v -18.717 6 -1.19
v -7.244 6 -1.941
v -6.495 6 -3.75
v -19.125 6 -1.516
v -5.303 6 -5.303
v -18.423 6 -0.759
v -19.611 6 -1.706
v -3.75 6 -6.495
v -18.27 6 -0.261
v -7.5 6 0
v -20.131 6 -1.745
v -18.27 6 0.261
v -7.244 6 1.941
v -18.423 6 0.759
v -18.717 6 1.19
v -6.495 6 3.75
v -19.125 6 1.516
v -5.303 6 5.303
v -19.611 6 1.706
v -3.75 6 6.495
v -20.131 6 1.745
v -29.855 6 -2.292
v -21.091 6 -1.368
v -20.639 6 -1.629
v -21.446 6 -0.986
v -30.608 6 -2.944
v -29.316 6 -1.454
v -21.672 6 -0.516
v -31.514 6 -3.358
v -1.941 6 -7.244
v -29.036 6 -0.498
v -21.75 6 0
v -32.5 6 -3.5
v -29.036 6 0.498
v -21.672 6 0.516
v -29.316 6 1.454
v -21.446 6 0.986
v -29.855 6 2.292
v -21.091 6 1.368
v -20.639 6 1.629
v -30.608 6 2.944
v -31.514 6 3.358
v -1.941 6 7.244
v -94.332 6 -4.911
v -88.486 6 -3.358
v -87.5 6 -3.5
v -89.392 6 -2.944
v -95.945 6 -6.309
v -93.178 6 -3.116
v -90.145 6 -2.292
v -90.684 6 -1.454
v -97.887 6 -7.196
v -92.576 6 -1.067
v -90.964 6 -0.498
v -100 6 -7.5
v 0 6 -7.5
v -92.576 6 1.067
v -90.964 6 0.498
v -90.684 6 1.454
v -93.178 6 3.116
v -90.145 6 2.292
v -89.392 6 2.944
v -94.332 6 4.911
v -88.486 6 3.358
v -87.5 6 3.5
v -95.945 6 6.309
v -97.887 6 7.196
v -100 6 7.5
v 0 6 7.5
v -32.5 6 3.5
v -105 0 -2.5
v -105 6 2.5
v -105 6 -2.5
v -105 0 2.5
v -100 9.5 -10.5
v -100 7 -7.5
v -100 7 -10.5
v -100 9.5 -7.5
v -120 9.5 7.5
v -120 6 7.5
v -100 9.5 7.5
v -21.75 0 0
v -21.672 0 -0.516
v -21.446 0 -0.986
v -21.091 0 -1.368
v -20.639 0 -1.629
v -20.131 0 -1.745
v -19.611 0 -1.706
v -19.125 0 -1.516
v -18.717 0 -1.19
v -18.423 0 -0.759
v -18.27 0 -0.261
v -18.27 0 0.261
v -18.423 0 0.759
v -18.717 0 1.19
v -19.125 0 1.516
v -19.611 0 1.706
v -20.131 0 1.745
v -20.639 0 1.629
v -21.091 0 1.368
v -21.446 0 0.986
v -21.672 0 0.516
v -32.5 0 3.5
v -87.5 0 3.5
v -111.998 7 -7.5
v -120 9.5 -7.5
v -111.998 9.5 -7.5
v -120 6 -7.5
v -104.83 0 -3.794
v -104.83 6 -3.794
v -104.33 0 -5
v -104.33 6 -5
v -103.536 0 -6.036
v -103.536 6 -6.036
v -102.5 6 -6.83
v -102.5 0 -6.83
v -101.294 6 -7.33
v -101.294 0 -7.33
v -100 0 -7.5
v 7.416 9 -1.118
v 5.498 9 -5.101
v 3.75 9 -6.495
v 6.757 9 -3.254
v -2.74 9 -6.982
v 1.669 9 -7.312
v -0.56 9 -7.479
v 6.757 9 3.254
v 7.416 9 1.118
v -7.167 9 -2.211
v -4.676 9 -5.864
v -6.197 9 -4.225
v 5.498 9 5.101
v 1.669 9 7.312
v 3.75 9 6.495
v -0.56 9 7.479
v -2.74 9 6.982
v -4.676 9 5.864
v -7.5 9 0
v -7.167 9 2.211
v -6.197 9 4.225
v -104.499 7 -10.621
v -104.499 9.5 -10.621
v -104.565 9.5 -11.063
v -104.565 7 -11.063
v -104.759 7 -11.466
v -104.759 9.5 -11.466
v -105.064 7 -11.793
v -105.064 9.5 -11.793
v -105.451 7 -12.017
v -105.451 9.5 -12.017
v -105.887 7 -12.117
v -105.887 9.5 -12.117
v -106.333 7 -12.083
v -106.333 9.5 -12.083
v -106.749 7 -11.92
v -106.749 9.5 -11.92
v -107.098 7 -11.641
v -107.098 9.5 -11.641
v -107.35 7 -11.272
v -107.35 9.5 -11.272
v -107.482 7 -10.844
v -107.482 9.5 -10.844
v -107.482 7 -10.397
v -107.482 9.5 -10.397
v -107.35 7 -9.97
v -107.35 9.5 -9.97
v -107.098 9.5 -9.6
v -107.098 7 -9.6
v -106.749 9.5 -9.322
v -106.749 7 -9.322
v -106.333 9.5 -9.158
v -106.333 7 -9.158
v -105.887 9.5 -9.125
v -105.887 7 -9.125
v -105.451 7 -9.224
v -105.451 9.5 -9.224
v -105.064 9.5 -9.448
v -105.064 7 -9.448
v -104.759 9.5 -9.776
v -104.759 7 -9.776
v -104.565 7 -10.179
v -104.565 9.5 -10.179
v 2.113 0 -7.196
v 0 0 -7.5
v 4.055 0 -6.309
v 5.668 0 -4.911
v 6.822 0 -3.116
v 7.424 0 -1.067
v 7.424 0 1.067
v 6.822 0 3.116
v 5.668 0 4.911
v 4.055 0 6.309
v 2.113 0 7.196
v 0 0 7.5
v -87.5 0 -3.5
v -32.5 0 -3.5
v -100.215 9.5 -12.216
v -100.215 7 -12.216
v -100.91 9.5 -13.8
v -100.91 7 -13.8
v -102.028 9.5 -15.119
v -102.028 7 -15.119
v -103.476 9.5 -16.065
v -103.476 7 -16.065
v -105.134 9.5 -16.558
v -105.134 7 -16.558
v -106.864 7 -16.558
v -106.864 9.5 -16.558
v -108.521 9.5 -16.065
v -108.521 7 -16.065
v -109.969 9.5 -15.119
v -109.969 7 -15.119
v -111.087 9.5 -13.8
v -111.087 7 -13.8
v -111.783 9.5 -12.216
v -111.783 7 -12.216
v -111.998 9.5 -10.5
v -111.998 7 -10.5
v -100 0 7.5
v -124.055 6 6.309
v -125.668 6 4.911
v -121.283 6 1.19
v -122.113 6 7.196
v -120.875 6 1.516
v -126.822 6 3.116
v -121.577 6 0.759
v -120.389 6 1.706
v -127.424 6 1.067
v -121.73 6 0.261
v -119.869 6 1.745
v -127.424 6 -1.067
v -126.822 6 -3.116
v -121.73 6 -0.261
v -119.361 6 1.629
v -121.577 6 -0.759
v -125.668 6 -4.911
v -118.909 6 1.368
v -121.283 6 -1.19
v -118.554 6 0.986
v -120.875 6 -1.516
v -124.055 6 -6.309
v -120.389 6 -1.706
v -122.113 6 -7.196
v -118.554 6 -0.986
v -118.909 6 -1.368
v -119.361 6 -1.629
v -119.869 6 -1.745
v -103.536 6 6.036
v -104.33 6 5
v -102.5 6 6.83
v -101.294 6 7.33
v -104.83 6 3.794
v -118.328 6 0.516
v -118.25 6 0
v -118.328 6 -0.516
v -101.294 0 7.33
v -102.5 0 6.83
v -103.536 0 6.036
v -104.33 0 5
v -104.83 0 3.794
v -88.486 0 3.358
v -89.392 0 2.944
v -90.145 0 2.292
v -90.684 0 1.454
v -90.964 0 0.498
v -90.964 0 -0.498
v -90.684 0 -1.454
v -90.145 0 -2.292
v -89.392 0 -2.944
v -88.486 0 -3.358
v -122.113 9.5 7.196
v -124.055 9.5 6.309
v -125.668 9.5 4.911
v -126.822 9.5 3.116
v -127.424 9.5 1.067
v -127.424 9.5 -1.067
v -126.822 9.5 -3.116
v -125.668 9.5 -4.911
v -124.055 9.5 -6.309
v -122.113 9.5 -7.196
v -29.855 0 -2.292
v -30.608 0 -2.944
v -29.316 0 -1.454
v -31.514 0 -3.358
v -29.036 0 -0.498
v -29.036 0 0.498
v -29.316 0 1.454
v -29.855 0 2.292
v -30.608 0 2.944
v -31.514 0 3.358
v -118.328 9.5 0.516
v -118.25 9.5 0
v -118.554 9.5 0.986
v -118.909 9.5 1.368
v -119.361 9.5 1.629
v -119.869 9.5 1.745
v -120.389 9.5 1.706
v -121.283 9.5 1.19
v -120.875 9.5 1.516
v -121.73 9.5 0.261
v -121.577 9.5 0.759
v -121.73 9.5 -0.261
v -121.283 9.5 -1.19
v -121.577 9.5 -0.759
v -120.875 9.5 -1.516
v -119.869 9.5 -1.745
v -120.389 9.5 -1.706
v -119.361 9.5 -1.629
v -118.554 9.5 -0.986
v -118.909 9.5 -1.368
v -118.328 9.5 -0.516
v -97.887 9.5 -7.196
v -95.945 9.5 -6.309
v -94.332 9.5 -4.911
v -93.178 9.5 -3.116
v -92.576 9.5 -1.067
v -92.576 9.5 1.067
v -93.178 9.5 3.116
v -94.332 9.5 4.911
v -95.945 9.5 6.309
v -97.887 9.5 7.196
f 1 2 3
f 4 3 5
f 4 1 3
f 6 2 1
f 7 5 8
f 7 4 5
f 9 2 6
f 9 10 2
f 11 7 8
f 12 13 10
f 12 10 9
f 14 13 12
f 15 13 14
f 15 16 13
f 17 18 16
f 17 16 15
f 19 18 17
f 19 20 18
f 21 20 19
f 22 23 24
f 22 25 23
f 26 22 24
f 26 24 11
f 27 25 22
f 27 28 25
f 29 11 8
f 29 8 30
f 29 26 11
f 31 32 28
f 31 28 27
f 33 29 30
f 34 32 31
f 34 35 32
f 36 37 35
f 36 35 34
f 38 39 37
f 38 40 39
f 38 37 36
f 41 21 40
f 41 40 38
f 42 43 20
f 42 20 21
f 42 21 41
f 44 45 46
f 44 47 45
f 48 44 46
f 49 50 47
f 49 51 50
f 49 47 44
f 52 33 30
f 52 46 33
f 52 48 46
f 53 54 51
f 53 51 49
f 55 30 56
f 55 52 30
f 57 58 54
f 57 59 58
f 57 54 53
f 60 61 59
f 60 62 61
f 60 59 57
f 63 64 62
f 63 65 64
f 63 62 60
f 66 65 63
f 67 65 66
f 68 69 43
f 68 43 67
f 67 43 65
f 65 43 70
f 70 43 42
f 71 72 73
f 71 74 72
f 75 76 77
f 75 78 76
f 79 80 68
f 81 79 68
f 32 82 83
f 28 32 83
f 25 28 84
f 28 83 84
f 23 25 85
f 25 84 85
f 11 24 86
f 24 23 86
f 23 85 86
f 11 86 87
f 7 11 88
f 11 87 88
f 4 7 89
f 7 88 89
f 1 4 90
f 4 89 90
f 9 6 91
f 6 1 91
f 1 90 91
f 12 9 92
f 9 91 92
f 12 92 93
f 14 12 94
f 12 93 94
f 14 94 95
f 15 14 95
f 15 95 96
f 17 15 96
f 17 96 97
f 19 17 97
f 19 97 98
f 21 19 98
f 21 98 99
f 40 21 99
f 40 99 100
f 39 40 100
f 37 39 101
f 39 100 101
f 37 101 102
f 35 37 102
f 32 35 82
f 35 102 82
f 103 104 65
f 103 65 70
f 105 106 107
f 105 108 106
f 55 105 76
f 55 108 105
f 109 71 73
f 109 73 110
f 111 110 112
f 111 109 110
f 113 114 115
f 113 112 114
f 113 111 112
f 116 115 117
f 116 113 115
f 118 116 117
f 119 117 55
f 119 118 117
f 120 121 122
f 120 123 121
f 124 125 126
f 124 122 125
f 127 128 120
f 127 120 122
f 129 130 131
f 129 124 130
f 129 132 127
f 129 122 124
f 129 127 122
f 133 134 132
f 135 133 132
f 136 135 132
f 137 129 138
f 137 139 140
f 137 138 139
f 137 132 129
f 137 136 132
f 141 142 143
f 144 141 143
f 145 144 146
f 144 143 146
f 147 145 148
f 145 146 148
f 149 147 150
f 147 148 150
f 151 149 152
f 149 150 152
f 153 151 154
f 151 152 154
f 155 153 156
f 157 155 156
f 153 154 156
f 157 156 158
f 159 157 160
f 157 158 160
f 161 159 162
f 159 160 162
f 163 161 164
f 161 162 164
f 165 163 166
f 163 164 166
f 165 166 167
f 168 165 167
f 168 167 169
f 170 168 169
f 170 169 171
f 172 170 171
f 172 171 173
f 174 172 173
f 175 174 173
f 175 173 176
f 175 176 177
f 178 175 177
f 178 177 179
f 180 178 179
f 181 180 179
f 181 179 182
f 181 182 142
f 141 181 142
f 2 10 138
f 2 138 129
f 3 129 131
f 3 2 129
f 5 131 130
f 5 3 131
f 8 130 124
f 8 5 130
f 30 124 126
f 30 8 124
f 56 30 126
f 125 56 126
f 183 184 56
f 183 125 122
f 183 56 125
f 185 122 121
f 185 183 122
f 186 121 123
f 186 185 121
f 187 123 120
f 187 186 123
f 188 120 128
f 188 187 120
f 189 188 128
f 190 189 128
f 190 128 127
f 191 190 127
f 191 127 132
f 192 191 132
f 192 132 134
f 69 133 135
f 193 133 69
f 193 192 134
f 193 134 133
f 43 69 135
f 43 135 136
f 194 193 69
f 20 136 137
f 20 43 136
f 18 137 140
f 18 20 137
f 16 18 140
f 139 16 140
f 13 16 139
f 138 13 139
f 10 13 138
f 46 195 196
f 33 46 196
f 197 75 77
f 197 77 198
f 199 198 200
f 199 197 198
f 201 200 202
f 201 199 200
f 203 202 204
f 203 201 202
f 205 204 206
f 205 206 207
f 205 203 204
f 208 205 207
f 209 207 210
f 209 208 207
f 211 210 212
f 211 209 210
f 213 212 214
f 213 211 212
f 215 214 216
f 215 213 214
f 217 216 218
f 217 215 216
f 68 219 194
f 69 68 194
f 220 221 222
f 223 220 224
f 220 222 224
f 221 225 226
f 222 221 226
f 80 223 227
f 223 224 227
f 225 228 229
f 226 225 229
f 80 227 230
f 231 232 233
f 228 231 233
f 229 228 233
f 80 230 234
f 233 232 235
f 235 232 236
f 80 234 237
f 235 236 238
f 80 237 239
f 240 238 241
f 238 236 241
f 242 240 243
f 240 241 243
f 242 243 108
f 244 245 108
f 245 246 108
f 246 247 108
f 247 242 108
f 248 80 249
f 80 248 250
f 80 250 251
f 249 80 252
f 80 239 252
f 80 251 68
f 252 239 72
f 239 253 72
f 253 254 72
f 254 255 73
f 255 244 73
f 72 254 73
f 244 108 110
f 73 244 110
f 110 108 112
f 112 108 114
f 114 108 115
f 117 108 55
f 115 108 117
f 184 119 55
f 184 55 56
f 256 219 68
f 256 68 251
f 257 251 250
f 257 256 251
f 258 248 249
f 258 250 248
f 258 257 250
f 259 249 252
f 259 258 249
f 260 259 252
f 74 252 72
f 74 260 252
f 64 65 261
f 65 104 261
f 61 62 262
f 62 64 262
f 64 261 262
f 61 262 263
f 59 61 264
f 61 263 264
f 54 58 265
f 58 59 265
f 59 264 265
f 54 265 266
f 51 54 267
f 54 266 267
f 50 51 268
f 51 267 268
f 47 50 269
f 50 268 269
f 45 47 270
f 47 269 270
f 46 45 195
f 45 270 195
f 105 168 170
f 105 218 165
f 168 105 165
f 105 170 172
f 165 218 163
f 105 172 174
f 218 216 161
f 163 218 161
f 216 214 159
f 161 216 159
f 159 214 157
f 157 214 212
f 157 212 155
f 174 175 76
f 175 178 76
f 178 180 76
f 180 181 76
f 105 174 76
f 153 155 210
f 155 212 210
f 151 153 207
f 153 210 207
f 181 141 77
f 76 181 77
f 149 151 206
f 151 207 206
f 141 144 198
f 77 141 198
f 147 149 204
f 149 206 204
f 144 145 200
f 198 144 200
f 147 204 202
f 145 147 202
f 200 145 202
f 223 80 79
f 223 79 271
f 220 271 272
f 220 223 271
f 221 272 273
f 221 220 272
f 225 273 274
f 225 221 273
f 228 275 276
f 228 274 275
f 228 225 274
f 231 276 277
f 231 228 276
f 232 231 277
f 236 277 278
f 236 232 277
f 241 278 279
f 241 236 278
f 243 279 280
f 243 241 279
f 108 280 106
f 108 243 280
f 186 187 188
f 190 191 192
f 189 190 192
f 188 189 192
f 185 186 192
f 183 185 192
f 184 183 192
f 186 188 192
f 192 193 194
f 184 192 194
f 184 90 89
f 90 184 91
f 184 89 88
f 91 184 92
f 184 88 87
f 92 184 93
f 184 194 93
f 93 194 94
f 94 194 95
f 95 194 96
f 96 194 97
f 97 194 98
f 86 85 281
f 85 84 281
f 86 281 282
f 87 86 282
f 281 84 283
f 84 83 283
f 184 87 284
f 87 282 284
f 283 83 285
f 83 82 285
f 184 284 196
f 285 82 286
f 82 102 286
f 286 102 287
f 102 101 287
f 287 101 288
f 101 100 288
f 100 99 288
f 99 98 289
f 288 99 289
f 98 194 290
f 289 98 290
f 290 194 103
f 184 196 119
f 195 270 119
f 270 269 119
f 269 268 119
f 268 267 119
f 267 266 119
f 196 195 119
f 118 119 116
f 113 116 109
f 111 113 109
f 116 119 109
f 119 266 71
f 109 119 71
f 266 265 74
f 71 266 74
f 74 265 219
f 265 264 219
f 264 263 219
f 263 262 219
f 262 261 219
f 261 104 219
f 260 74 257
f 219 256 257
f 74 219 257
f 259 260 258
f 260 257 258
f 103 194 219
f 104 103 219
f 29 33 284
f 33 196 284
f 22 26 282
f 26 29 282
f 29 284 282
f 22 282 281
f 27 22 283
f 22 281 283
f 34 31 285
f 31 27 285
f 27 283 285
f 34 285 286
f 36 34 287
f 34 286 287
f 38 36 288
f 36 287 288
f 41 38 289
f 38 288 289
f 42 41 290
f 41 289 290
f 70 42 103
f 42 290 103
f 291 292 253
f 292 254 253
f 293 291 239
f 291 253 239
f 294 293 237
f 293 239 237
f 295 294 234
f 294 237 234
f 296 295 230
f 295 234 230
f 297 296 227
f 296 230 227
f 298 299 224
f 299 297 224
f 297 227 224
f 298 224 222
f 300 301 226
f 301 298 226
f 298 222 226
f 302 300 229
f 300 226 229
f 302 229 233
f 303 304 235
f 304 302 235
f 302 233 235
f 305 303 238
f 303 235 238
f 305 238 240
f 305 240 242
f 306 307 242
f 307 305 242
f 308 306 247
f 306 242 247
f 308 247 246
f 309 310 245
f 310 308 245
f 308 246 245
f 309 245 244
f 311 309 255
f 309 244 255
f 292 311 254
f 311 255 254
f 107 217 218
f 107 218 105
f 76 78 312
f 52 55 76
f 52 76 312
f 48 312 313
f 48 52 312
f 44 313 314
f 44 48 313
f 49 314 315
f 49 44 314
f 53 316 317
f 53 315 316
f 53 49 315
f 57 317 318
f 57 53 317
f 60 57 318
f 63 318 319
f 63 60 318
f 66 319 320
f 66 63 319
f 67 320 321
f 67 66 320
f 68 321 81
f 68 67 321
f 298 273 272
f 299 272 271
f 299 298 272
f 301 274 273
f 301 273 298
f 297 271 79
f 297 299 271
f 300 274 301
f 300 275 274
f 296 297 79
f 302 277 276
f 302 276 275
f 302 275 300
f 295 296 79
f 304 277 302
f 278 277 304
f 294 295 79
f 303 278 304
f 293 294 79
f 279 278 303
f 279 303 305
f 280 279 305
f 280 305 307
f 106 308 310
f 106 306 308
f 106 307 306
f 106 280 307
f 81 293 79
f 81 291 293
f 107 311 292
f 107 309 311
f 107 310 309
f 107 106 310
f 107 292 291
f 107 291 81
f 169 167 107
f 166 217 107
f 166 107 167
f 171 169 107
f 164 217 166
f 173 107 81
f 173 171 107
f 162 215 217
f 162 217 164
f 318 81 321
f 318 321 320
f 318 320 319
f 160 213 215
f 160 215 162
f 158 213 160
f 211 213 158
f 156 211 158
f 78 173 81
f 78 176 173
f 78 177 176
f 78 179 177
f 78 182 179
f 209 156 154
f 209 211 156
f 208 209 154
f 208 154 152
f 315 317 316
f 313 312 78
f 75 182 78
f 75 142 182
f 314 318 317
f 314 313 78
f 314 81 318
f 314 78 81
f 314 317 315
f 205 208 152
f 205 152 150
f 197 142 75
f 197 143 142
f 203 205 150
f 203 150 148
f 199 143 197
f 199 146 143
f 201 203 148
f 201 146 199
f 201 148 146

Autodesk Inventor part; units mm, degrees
ref_plane "YZ Plane" through (0, 0, 0) normal (1, 0, 0) x (0, 1, 0)
ref_plane "XZ Plane" through (0, 0, 0) normal (0, 1, 0) x (-1, 0, 0)
ref_plane "XY Plane" through (0, 0, 0) normal (0, 0, 1) x (1, 0, 0)
sketch "Boceto1" plane through (0, 0, 0) normal (0, 1, 0) x (-1, 0, 0)
  circle A0 centre (0, 0) radius 7.5
  circle A1 centre (20, 0) radius 1.75
  arc A2 (87.5, -3.5) -> (87.5, 3.5) centre (87.5, 0) ccw
  arc A3 (32.5, 3.5) -> (32.5, -3.5) centre (32.5, 0) ccw
  line L0 (100, -7.5) -> (0, -7.5)
  line L1 (100, 7.5) -> (0, 7.5)
  line L2 (87.5, -3.5) -> (32.5, -3.5)
  line L3 (87.5, 3.5) -> (32.5, 3.5)
  arc A4 (105, 2.5) -> (100, 7.5) centre (100, 2.5) ccw
  arc A5 (100, -7.5) -> (105, -2.5) centre (100, -2.5) ccw
  line L4 (105, 2.5) -> (105, -2.5)
  dimension "d0" = 15
  dimension "d3" = 3.5
  dimension "d5" = 7
  dimension "d7" = 7
  dimension "d10" = 100
  dimension "d12" = 55
  dimension "d13" = 55
extrude "Extrusión1" add sketch "Boceto1" along normal blind 9 contours A0
extrude "Extrusión2" add sketch "Boceto1" along normal blind 6 contours A0 L1 A4 L4 A5 L0
sketch "Boceto2" plane through (0, 6, 0) normal (0, 1, 0) x (1, 0, 0)
  line L0 (-100, -7.5) -> (0, -7.5) projected
  arc A0 (0, 7.5) -> (0, -7.5) centre (0, 0) ccw projected
  line L1 (0, 7.5) -> (-100, 7.5) projected
  arc A1 (-100, 7.5) -> (-105, 2.5) centre (-100, 2.5) ccw projected
  line L2 (-105, 2.5) -> (-105, -2.5) projected
  arc A2 (-105, -2.5) -> (-100, -7.5) centre (-100, -2.5) ccw projected
  line L3 (-87.5, 3.5) -> (-32.5, 3.5) projected
  arc A3 (-32.5, -3.5) -> (-32.5, 3.5) centre (-32.5, 0) ccw projected
  line L4 (-32.5, -3.5) -> (-87.5, -3.5) projected
  arc A4 (-87.5, 3.5) -> (-87.5, -3.5) centre (-87.5, 0) ccw projected
  circle A5 centre (-20, 0) radius 1.75 projected
  arc A6 (-100, -7.5) -> (-100, 7.5) centre (-100, 0) ccw
  circle A7 centre (-120, 0) radius 1.75
  arc A8 (-120, 7.5) -> (-120, -7.5) centre (-120, 0) ccw
  line L5 (-120, -7.5) -> (-100, -7.5)
  line L6 (-120, 7.5) -> (-100, 7.5)
  dimension "d22" = 15
  dimension "d24" = 3.5
  dimension "d25" = 15
  dimension "d26" = 20
  dimension "d27" = 20
extrude "Extrusión3" add sketch "Boceto2" along normal blind 3.5 contours L5 A8 L6 A1 L2 A2 | A2 L2 A1 A6
sketch "Boceto3" plane through (0, 9.5, 0) normal (0, 1, 0) x (1, 0, 0)
  line L0 (-87.5, 3.5) -> (-32.5, 3.5) projected
  line L1 (-120, -7.5) -> (-100, -7.5) projected
  arc A0 (-100, -7.5) -> (-100, 7.5) centre (-100, 0) ccw projected
  line L2 (-100, 7.5) -> (-120, 7.5) projected
  arc A1 (-120, 7.5) -> (-120, -7.5) centre (-120, 0) ccw projected
  circle A2 centre (-120, 0) radius 1.75 projected
  line L3 (0, 7.5) -> (-100, 7.5) projected
  line L4 (-100, 7.5) -> (-100, 10.5)
  circle A3 centre (-105.9988, 10.6207) radius 1.5
  arc A4 (-100, 10.5) -> (-111.9976, 10.5) centre (-105.9988, 10.6207) ccw
  arc A5 (-100, 7.5) -> (-105, 2.5) centre (-100, 2.5) ccw projected
  line L5 (-111, 7.5) -> (-100, 7.5)
  line L6 (-111.9976, 10.5) -> (-111.9976, 7.5)
  point P0 (0, 0)
  dimension "d32" = 3
  dimension "d37" = 6
  dimension "d38" = 3
  dimension "d39" = 3
extrude "Extrusión4" add sketch "Boceto3" against normal blind 2.5 contours L2 L6 A4 L4
properties part number "pieza3parte3"
